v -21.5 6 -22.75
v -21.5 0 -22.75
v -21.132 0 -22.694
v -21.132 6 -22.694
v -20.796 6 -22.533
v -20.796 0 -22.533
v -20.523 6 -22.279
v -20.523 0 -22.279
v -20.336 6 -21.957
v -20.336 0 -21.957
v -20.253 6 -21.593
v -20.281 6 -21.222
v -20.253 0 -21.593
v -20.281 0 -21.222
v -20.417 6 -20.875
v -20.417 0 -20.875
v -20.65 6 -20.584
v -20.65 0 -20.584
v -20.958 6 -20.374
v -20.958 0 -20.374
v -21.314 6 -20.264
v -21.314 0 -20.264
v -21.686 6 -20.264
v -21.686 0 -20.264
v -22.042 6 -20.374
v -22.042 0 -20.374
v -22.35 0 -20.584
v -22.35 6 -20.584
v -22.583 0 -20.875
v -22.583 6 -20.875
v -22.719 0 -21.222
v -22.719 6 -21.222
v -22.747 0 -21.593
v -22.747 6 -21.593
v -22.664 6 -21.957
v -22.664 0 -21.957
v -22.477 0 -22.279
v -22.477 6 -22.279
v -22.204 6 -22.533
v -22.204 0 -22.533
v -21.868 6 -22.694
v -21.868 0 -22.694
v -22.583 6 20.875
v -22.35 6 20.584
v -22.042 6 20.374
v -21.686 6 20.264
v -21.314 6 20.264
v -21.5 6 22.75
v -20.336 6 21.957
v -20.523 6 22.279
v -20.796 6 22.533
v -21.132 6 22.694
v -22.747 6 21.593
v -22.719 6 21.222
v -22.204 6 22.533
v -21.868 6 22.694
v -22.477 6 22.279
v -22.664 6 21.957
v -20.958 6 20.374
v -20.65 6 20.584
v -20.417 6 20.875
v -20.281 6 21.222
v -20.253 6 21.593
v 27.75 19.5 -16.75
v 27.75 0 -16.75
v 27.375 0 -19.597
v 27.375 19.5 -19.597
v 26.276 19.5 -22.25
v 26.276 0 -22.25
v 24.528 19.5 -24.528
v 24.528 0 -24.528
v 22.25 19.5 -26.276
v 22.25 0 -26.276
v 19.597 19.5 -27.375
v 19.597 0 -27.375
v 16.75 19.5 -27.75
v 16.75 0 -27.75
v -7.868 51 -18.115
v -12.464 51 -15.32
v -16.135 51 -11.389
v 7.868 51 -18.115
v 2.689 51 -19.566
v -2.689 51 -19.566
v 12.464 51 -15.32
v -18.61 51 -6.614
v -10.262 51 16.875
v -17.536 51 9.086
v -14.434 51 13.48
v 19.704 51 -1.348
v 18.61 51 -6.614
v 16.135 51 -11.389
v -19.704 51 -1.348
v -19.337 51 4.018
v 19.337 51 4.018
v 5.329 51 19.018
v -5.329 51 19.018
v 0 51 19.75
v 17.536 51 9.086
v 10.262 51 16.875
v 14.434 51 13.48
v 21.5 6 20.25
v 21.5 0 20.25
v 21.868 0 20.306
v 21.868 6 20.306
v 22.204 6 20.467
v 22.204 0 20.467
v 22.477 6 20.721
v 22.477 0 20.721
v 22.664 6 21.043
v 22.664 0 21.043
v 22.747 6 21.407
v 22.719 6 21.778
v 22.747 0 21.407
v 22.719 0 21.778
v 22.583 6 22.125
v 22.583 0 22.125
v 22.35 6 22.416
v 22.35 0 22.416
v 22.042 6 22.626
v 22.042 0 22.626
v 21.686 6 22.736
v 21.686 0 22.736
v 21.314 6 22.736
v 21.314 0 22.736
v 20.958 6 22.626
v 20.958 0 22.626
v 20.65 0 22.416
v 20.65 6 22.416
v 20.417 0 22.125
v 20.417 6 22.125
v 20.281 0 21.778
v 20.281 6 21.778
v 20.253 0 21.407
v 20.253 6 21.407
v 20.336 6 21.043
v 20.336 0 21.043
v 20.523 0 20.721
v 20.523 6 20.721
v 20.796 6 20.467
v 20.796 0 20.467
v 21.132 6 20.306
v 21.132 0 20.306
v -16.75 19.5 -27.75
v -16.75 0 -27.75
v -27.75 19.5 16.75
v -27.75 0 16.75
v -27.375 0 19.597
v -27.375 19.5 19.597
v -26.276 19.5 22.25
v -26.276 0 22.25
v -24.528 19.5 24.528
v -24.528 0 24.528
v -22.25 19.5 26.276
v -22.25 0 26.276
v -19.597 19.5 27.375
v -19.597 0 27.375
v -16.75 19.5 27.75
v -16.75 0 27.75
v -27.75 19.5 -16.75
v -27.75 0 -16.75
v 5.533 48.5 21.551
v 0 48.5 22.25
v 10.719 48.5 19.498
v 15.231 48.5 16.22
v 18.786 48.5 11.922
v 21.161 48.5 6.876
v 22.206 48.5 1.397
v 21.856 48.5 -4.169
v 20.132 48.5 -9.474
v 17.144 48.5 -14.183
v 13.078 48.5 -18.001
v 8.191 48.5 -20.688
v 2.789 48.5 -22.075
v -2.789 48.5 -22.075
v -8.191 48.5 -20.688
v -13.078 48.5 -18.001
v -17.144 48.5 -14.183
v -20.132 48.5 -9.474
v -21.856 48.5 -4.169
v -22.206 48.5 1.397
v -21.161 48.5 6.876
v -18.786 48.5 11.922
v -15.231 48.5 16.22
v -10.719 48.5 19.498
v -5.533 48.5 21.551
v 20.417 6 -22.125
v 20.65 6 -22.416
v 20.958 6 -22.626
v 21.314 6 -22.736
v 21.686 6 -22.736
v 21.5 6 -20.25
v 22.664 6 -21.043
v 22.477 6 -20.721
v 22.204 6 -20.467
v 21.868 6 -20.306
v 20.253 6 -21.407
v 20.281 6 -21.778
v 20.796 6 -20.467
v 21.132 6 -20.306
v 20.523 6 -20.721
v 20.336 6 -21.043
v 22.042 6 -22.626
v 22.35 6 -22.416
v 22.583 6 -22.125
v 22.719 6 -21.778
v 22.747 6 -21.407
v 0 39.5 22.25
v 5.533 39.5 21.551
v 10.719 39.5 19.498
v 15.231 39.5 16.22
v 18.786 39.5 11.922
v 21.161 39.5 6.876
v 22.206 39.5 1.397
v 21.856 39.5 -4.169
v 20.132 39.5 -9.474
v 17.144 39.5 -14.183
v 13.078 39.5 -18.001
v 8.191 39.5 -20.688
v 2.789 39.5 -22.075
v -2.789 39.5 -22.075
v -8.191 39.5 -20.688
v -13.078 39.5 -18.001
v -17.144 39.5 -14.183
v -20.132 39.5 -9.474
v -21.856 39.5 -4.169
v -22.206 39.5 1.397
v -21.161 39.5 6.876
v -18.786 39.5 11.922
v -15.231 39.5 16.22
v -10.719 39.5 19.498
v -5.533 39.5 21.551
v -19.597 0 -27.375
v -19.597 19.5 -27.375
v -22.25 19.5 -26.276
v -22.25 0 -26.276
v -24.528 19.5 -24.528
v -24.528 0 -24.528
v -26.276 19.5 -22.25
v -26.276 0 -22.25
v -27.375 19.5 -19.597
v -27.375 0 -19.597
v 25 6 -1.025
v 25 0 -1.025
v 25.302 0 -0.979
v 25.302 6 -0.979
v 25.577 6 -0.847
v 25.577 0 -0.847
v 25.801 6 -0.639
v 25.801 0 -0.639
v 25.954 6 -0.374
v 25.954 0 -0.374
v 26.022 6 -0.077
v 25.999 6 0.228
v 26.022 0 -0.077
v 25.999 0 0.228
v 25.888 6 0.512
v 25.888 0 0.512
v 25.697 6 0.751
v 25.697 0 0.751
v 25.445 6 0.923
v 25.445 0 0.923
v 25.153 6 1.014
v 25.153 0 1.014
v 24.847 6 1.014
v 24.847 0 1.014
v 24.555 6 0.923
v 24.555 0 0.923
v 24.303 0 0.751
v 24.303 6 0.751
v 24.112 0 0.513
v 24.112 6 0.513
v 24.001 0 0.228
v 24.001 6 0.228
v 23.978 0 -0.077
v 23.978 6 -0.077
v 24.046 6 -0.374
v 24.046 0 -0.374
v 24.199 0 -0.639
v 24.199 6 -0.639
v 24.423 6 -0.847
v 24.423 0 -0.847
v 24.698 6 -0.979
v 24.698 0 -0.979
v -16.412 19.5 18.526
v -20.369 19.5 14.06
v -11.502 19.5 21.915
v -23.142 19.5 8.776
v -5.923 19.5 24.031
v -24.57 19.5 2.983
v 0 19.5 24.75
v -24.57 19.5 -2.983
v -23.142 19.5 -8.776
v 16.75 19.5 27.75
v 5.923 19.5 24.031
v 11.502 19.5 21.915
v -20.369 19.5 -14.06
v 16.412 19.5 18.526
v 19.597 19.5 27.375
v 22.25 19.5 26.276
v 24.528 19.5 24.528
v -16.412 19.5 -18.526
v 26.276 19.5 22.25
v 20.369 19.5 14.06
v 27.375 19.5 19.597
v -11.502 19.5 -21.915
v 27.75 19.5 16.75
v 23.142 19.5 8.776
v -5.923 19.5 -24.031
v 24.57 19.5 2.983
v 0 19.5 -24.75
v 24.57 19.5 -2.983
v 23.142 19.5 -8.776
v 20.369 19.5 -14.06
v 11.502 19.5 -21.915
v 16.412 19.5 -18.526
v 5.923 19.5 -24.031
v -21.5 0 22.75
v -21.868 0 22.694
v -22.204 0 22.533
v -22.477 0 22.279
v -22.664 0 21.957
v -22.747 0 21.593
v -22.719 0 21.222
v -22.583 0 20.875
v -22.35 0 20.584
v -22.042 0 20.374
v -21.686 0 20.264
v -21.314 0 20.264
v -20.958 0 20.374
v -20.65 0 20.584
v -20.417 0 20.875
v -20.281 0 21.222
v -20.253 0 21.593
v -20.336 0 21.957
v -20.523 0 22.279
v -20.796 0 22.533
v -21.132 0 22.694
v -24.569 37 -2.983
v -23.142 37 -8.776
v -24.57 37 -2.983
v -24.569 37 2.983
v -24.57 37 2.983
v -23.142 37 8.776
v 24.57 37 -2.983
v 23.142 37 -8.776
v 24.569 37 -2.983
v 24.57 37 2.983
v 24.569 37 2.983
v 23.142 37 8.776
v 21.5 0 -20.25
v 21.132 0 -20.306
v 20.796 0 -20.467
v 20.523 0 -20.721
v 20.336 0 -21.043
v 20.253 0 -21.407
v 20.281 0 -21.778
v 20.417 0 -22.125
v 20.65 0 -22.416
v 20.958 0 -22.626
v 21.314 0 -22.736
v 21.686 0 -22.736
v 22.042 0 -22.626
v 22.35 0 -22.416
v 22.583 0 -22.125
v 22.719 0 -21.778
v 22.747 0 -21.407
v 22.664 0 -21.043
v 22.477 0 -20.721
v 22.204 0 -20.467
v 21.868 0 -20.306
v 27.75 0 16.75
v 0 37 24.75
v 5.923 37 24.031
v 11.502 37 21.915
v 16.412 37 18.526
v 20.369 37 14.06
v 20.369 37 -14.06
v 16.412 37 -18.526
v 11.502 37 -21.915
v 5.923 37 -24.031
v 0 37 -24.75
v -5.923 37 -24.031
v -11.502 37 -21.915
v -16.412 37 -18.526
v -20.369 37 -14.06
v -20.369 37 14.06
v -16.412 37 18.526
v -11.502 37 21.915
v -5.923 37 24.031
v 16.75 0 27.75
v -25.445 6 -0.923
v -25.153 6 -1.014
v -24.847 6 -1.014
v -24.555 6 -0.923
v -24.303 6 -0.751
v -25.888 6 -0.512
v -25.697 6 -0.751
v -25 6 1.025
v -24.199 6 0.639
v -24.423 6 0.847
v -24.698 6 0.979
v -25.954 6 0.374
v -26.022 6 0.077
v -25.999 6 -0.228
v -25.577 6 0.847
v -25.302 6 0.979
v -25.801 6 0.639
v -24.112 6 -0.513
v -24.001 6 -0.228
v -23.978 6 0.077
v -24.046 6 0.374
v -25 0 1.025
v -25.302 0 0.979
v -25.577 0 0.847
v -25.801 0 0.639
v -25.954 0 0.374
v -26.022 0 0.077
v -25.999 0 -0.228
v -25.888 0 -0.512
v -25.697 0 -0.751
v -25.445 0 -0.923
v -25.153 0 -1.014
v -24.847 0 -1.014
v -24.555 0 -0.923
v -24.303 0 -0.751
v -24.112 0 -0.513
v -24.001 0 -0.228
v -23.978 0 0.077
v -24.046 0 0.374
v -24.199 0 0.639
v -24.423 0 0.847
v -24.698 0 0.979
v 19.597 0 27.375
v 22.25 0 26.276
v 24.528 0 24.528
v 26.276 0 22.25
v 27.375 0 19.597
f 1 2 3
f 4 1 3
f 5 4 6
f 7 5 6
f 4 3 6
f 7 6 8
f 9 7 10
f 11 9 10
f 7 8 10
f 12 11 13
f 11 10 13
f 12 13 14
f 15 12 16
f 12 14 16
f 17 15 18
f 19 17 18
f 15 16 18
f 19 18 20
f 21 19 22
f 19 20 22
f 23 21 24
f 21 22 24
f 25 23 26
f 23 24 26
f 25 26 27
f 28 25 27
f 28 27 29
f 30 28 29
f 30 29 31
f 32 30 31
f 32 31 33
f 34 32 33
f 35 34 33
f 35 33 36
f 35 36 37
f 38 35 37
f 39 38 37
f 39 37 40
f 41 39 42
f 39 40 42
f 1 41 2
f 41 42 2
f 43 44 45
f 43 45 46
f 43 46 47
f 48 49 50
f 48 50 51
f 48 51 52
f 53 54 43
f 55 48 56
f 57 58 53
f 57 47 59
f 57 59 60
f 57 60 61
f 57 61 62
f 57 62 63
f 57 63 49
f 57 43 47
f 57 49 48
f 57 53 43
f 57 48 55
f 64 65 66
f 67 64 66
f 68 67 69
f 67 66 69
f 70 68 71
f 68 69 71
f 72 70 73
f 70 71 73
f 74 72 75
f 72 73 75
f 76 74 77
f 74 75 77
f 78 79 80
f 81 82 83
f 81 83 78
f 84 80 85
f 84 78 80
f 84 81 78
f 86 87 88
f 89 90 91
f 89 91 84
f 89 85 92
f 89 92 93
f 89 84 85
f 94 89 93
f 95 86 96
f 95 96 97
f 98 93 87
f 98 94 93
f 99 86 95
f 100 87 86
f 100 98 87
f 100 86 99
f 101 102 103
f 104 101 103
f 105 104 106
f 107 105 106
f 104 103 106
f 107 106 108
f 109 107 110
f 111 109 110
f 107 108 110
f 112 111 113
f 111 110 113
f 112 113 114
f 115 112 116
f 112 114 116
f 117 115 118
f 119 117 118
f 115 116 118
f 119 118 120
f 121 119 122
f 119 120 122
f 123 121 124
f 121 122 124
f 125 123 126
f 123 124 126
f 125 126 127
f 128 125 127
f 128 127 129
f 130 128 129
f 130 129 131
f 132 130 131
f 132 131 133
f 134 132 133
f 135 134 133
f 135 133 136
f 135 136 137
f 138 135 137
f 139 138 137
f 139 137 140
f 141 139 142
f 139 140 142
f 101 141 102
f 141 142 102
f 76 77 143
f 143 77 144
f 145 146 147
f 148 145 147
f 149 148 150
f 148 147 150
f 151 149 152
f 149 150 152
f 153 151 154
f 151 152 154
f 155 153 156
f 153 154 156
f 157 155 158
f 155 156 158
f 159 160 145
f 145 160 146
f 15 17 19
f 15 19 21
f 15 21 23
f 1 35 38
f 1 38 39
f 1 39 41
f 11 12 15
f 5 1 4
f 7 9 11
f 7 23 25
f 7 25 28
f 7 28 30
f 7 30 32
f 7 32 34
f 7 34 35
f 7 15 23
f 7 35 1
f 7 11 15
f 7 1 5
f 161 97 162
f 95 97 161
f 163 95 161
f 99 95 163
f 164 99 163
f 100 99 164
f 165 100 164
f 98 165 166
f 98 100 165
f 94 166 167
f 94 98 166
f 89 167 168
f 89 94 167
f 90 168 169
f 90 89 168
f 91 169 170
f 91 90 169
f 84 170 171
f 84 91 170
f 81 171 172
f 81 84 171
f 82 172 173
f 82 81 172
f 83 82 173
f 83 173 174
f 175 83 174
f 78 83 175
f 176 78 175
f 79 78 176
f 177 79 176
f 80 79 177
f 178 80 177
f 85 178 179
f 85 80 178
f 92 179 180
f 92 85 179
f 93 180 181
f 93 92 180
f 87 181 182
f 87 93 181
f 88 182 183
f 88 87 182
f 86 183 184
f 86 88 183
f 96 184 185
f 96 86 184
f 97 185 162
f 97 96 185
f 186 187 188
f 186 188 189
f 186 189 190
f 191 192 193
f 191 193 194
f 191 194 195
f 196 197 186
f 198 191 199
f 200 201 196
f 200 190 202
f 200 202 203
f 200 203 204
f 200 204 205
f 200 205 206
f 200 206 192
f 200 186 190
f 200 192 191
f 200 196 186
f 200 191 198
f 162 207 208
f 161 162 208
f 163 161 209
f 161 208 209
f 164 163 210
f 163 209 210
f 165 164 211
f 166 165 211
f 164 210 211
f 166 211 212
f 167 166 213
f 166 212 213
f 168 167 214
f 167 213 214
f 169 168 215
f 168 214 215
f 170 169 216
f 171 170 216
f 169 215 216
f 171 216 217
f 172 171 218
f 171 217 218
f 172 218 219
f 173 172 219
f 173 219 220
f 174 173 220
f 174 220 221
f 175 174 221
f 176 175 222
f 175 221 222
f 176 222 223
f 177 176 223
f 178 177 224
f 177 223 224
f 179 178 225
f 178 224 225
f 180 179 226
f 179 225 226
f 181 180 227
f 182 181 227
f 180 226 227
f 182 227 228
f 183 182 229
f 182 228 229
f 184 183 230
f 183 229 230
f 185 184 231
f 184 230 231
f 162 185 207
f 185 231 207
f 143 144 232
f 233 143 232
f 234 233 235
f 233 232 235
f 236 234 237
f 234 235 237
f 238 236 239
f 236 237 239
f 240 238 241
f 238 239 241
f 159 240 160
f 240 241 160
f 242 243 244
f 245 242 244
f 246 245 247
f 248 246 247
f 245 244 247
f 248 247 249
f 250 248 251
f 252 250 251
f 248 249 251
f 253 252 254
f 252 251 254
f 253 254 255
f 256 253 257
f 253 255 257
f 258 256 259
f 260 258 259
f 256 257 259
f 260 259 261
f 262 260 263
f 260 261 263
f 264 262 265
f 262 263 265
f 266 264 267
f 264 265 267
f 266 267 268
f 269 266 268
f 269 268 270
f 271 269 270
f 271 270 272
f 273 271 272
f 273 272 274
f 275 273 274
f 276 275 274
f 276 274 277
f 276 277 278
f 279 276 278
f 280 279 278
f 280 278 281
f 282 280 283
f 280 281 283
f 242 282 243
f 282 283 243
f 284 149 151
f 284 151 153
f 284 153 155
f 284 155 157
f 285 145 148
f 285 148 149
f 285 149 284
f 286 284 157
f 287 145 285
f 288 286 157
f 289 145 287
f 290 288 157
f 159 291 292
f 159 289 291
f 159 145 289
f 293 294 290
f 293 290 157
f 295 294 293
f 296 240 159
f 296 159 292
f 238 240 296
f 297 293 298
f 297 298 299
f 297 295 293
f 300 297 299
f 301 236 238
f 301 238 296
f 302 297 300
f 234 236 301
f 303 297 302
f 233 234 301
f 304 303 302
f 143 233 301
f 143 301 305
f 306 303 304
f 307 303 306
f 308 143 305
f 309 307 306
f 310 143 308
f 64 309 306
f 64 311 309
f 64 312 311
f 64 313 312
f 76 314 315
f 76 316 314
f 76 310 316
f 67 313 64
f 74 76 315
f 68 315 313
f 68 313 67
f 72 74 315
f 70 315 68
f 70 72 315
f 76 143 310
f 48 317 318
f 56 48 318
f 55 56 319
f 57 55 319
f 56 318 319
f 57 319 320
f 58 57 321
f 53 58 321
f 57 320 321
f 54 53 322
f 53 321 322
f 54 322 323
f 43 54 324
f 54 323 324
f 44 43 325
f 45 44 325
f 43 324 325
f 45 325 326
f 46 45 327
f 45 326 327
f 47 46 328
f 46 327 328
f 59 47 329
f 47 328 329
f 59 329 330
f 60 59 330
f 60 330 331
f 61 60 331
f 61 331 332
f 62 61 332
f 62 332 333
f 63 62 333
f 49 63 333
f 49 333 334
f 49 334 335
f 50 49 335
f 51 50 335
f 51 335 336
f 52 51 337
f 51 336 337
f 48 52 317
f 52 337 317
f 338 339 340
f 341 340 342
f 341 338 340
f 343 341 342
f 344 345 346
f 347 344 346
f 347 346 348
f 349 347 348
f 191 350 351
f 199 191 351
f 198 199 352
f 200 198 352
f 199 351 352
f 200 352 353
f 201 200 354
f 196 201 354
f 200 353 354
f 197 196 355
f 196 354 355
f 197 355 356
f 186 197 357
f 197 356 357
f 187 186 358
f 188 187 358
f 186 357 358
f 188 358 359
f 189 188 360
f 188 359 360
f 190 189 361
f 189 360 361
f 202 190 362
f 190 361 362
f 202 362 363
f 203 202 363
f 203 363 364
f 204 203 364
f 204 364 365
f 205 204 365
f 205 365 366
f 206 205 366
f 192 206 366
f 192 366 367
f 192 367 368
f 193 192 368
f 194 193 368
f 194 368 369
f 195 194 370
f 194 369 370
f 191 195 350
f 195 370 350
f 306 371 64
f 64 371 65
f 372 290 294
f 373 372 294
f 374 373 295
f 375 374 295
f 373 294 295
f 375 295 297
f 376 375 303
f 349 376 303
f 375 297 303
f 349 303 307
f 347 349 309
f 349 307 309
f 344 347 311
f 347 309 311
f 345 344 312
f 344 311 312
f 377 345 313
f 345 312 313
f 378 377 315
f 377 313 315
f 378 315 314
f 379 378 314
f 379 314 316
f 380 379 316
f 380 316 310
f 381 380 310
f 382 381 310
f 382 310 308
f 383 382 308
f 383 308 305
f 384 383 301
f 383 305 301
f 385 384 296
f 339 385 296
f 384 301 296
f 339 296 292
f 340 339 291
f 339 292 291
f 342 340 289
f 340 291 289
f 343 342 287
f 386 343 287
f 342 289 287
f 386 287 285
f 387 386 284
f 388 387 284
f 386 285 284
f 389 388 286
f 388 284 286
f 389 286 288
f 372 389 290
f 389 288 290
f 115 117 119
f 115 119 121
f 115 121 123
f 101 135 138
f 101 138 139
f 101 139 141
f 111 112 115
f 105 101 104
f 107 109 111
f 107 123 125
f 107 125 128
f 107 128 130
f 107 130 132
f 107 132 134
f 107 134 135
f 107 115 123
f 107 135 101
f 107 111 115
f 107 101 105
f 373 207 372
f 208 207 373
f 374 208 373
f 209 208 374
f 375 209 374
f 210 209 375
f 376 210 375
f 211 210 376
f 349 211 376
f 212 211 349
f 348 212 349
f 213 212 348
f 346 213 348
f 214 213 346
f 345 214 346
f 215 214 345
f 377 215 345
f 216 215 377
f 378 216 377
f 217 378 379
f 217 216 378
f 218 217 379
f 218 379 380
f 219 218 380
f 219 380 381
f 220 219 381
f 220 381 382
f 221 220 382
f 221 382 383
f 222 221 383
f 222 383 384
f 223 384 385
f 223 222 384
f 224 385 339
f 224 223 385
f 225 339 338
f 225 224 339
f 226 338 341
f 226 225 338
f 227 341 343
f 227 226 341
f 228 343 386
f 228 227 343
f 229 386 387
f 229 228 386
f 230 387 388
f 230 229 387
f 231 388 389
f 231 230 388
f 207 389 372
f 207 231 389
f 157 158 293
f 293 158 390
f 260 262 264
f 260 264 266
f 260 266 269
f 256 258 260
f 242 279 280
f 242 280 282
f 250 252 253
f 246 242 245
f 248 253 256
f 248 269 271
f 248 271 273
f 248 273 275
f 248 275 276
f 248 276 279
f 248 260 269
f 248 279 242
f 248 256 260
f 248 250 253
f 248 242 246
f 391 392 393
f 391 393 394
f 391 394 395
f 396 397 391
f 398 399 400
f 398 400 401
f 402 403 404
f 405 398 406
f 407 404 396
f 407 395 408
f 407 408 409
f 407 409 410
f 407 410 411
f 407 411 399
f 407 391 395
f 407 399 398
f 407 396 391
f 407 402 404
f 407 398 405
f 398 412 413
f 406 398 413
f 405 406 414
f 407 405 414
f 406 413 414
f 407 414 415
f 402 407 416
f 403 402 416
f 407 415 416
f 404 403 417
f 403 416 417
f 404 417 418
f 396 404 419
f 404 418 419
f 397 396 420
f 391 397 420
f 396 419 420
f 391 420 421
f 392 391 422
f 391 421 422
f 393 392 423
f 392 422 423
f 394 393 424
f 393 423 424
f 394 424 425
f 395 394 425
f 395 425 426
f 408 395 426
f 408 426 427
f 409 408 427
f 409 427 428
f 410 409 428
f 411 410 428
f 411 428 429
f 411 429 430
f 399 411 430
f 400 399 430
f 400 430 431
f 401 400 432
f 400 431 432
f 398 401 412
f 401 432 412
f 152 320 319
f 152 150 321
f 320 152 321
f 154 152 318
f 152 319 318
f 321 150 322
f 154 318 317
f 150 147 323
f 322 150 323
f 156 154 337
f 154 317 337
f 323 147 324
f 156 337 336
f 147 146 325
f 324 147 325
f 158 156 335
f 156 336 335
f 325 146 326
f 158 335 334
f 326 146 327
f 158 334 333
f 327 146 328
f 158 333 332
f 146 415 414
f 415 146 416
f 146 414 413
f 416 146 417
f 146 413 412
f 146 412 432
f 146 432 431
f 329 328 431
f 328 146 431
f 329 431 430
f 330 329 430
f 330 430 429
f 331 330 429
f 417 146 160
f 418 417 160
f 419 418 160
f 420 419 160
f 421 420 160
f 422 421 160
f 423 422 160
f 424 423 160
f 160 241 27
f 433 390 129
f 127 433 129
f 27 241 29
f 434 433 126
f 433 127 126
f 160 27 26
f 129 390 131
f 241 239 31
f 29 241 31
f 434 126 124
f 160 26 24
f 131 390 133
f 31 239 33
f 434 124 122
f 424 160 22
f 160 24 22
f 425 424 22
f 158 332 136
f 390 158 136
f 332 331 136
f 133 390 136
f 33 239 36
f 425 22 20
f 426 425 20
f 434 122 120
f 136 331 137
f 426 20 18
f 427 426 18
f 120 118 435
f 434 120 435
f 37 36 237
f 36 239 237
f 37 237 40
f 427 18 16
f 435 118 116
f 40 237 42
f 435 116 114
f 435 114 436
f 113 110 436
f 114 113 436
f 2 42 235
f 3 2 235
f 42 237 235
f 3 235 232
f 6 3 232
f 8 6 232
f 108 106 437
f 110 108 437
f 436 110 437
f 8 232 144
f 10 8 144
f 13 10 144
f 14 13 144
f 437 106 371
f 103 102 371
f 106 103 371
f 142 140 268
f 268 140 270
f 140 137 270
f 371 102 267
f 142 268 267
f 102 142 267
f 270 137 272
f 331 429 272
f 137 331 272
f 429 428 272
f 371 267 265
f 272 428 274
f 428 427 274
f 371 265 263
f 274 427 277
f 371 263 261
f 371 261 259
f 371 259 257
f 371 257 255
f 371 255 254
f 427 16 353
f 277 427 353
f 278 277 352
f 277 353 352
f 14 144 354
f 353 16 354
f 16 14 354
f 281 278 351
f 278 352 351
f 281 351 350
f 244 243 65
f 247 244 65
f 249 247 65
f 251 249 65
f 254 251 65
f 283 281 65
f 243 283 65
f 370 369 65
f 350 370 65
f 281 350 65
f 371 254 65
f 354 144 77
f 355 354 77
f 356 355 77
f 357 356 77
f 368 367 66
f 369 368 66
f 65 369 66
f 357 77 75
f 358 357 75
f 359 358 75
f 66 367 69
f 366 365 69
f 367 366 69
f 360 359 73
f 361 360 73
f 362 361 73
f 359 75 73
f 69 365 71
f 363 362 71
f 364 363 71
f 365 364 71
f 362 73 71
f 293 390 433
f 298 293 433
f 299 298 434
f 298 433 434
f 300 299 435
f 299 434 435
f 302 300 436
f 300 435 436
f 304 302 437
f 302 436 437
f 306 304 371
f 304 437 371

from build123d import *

# Parameters (mm, degrees)
BOSS_EXTRUDE1_DEPTH = 19.5
SKETCH2_R           = 24.75
BOSS_EXTRUDE2_DEPTH = 17.5
SKETCH3_R           = 22.25
BOSS_EXTRUDE3_DEPTH = 14
FILLET1_SIZE        = 2.5
SKETCH4_R           = 1.25
SKETCH4_R_2         = 1.025
CUT_EXTRUDE1_DEPTH  = 6


with BuildPart() as part:
    # Sketch1 → Boss-Extrude1 (new body)
    with BuildSketch(Plane(origin=(0, 0, 0), x_dir=(1, 0, 0), z_dir=(0, 1, 0))):
        with BuildLine():
            Line((-16.75, -27.75), (16.75, -27.75))
            ThreePointArc((16.75, -27.75), (24.528174593, -24.528174593), (27.75, -16.75))
            Line((27.75, -16.75), (27.75, 16.75))
            ThreePointArc((27.75, 16.75), (24.528174593, 24.528174593), (16.75, 27.75))
            Line((16.75, 27.75), (-16.75, 27.75))
            ThreePointArc((-16.75, 27.75), (-24.528174593, 24.528174593), (-27.75, 16.75))
            Line((-27.75, 16.75), (-27.75, -16.75))
            ThreePointArc((-27.75, -16.75), (-24.528174593, -24.528174593), (-16.75, -27.75))
        make_face()
    extrude(amount=BOSS_EXTRUDE1_DEPTH)

    # Sketch2 → Boss-Extrude2 (add)
    with BuildSketch(Plane(origin=(0, 19.5, 0), x_dir=(1, 0, 0), z_dir=(0, 1, 0))):
        with Locations(Location((0, 0, 0), (0, 0, 270))):
            Circle(SKETCH2_R)
    extrude(amount=BOSS_EXTRUDE2_DEPTH)

    # Sketch3 → Boss-Extrude3 (add)
    with BuildSketch(Plane(origin=(0, 37, 0), x_dir=(1, 0, 0), z_dir=(0, 1, 0))):
        with Locations(Location((0, 0, 0), (0, 0, 270))):
            Circle(SKETCH3_R)
    extrude(amount=BOSS_EXTRUDE3_DEPTH)

    # Fillet1
    fillet1_edges = [part.edges().sort_by_distance(p)[0] for p in [
        (0, 37, -22.25),
        (0, 51, -22.25),
    ]]
    chamfer(fillet1_edges, length=FILLET1_SIZE - 0.0001)  # a hair under: the kernel refuses the full size

    # Sketch4 → Cut-Extrude1 (cut)
    with BuildSketch(Plane.XZ):
        with Locations(Location((21.5, 21.5, 0), (0, 0, 270))):
            Circle(SKETCH4_R)
        with Locations(Location((25, 0, 0), (0, 0, 270))):
            Circle(SKETCH4_R_2)
        with Locations(Location((21.5, -21.5, 0), (0, 0, 90))):
            Circle(SKETCH4_R)
        with Locations(Location((-21.5, -21.5, 0), (0, 0, 270))):
            Circle(SKETCH4_R)
        with Locations(Location((-25, 0, 0), (0, 0, 90))):
            Circle(SKETCH4_R_2)
        with Locations(Location((-21.5, 21.5, 0), (0, 0, 90))):
            Circle(SKETCH4_R)
    extrude(amount=-CUT_EXTRUDE1_DEPTH, mode=Mode.SUBTRACT)


solid = part.part
